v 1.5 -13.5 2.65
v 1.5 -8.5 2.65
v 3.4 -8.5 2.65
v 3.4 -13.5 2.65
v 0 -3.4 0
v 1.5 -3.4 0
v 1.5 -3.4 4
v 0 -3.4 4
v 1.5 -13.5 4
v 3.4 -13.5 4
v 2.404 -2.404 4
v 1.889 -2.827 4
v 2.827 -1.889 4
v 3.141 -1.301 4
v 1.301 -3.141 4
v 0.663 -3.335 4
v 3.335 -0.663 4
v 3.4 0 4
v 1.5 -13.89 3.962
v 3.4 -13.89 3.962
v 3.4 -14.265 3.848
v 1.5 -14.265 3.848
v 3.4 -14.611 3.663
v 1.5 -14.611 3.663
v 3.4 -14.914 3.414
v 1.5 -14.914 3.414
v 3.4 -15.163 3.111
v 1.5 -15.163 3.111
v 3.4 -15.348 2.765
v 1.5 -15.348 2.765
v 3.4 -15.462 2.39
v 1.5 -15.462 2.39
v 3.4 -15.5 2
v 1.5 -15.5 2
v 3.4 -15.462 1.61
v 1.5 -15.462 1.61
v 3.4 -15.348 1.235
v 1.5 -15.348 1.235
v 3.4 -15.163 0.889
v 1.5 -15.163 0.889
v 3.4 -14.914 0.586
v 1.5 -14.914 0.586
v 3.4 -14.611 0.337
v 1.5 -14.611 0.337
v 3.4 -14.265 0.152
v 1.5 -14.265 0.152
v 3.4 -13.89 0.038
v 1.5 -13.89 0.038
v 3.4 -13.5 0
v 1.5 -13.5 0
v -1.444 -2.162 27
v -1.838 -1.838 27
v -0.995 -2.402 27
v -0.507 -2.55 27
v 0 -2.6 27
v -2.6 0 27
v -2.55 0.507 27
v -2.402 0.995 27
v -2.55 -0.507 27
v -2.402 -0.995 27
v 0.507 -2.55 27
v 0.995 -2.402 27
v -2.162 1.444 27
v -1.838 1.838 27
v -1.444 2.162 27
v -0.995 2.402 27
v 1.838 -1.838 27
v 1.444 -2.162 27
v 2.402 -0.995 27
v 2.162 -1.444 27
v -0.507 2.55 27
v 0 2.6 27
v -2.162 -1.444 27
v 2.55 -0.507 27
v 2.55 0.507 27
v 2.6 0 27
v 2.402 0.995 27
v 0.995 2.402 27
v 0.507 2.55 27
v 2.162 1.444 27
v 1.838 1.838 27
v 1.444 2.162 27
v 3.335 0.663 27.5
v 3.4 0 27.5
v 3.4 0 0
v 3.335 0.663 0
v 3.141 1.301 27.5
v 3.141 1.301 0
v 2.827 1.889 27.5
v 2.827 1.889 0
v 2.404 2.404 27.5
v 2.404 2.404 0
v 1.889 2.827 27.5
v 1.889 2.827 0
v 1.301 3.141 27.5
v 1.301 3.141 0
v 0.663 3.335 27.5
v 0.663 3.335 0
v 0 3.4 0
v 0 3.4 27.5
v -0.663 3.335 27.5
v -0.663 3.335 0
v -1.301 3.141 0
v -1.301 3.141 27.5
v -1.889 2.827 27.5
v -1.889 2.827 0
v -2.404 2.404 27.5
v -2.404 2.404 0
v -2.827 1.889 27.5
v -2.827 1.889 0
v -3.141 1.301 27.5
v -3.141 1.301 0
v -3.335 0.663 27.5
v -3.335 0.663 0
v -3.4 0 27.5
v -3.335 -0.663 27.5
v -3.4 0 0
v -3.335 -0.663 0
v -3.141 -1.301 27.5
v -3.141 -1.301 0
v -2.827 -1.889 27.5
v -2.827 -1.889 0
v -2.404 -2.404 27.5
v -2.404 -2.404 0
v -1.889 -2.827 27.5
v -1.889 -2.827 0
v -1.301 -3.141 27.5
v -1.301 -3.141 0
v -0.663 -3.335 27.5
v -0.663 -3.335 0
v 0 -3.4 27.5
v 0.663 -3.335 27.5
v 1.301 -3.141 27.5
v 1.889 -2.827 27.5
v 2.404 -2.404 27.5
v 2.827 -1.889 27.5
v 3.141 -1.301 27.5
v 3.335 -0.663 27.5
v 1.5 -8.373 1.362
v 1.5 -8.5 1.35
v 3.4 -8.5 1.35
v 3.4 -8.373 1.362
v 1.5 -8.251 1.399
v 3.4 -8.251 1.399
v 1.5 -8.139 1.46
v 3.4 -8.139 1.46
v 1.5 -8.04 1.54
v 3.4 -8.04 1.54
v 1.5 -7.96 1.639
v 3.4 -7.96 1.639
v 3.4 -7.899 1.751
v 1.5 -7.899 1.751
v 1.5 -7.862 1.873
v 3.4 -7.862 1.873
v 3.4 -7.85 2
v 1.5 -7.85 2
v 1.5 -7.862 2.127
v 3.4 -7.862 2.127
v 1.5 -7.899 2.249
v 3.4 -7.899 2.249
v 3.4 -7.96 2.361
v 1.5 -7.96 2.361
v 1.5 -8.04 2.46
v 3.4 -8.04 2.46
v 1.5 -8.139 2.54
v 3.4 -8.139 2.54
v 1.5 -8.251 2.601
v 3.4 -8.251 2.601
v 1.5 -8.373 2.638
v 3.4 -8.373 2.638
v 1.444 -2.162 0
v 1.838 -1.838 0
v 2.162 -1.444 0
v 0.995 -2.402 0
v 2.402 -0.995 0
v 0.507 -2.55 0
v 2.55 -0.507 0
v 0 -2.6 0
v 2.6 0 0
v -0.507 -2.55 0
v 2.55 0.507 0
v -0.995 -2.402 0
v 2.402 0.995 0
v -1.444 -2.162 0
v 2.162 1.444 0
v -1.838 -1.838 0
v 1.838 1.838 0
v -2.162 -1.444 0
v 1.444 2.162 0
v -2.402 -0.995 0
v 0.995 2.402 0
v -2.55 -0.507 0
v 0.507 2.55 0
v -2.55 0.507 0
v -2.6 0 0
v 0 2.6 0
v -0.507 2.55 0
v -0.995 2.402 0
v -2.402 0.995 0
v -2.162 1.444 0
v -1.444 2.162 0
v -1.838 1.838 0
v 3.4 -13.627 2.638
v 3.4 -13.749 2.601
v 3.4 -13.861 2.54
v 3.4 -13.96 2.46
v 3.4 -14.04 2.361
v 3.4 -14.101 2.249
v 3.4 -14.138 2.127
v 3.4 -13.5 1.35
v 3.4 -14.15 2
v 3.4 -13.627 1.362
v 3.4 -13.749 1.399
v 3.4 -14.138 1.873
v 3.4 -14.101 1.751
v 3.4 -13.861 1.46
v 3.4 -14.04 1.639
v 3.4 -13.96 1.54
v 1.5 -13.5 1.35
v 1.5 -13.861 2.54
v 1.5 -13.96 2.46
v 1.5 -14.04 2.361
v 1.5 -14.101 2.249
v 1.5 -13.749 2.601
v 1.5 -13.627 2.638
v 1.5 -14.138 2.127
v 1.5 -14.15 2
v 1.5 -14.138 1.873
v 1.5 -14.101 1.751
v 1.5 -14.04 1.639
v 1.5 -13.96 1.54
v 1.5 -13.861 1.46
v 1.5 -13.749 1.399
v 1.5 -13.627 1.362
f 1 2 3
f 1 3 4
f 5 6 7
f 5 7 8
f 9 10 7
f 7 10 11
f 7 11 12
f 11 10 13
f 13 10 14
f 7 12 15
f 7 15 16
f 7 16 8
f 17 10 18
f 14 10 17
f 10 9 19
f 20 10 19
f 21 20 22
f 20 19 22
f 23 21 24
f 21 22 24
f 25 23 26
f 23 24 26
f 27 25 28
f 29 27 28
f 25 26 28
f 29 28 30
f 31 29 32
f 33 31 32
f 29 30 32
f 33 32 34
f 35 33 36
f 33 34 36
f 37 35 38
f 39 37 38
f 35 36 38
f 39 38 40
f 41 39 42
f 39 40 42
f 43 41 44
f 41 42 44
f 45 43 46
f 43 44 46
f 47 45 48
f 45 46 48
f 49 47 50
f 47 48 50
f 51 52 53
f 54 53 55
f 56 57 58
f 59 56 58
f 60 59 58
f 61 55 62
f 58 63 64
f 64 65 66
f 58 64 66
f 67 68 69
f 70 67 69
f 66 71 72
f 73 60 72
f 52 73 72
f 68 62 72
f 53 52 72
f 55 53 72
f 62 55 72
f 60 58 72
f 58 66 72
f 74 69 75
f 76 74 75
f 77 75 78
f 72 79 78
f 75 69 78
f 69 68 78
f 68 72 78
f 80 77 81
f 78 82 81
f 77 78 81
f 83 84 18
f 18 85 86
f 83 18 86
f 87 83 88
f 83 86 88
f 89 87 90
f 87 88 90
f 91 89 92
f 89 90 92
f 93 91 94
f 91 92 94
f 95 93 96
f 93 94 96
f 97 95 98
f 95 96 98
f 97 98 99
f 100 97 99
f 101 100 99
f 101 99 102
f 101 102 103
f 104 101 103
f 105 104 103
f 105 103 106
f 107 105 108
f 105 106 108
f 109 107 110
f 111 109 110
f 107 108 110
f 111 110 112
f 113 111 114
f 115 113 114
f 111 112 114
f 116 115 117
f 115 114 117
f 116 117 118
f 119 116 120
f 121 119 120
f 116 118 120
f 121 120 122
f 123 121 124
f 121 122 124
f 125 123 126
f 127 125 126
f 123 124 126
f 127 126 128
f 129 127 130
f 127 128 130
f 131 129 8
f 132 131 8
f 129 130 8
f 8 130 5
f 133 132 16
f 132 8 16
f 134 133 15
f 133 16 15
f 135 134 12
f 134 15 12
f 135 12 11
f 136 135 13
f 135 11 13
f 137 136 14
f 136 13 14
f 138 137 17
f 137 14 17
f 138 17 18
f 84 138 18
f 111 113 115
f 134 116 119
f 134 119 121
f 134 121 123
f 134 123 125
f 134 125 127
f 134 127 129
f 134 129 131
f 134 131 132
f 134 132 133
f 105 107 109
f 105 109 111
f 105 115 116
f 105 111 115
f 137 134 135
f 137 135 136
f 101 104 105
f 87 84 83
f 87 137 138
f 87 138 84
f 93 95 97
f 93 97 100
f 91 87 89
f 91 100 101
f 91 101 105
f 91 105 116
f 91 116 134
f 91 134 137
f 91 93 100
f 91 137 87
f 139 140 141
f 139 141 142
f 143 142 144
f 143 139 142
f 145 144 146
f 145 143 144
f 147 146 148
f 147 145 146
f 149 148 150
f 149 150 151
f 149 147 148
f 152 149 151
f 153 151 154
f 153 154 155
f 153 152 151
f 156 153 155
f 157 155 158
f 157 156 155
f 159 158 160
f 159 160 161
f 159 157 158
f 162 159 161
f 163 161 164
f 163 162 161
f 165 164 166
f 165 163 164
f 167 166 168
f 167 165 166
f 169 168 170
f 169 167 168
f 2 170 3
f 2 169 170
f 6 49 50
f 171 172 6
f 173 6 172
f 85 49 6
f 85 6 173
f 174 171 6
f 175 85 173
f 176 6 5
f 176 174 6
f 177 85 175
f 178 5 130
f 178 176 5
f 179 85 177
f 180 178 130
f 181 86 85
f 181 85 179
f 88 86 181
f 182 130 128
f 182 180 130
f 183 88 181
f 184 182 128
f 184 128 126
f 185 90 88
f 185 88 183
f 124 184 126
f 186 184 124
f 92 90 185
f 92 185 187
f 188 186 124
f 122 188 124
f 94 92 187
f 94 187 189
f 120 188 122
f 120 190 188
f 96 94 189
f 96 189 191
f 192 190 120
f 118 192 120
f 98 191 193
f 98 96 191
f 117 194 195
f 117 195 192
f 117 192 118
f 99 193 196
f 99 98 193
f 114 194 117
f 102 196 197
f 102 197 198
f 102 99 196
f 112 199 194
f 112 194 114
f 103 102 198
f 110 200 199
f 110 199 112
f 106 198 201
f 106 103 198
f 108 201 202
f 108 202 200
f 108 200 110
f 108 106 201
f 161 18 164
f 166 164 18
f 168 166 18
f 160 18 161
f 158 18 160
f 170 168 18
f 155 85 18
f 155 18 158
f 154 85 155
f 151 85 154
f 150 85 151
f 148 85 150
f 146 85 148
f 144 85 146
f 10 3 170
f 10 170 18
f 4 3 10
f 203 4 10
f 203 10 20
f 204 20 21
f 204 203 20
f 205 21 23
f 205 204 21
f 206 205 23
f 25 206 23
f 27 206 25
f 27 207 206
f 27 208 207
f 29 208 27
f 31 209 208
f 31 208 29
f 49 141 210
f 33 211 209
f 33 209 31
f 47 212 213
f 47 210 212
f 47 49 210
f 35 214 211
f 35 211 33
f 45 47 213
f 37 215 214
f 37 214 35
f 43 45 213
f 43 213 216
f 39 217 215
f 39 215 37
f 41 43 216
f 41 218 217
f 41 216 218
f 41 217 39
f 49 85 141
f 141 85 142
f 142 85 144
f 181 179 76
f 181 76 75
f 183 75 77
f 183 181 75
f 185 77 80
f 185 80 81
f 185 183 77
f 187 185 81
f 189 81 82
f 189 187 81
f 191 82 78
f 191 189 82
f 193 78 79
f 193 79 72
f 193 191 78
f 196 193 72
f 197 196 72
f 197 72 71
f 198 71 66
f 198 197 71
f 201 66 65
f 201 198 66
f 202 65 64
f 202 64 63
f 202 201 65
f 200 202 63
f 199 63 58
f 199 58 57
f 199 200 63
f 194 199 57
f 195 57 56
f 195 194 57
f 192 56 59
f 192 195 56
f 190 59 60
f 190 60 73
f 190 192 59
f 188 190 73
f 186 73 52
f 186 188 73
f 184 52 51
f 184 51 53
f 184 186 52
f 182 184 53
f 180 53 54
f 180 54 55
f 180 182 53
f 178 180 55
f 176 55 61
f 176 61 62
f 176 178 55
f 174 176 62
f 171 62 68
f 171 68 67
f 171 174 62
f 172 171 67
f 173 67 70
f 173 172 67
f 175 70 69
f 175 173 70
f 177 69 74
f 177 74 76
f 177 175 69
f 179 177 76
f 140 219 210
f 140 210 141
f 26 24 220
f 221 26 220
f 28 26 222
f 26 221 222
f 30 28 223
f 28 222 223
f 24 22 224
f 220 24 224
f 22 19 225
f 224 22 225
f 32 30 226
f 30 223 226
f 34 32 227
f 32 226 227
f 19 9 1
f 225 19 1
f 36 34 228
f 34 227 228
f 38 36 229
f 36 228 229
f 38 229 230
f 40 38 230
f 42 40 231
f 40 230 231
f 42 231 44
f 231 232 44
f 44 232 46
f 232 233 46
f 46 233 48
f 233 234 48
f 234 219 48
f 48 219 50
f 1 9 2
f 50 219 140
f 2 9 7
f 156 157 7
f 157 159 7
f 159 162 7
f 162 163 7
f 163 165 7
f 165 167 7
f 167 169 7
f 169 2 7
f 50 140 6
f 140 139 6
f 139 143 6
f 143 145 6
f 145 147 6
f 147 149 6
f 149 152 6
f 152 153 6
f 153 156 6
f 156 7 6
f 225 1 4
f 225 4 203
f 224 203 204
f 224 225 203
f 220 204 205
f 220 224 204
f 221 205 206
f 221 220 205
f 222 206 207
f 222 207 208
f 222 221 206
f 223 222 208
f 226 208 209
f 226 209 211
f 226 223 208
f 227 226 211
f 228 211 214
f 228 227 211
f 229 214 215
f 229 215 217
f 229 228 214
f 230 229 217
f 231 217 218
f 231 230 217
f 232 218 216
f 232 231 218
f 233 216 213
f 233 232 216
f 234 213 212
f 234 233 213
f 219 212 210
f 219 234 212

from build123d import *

# Parameters (mm, degrees)
ESQUISSE5_R        = 3.4
ESQUISSE5_R_2      = 2.6
BOSS_EXTRU_1_DEPTH = 27
ESQUISSE6_R        = 3.4
BOSS_EXTRU_2_DEPTH = 0.5
BOSS_EXTRU_4_START = 1.5
BOSS_EXTRU_4_DEPTH = 1.9
BOSS_EXTRU_5_DEPTH = 4


with BuildPart() as part:
    # Esquisse5 → Boss.-Extru.1 (new body)
    with BuildSketch(Plane.XY):
        Circle(ESQUISSE5_R)
        Circle(ESQUISSE5_R_2, mode=Mode.SUBTRACT)
    extrude(amount=BOSS_EXTRU_1_DEPTH)

    # Esquisse6 → Boss.-Extru.2 (add)
    with BuildSketch(Plane.XY.offset(27)):
        Circle(ESQUISSE6_R)
    extrude(amount=BOSS_EXTRU_2_DEPTH)



with BuildPart() as body_2:
    # Esquisse9 → Boss.-Extru.4 (new body)
    with BuildSketch(Plane(origin=(0, 0, 0), x_dir=(0, 0, -1), z_dir=(1, 0, 0)).offset(BOSS_EXTRU_4_START)):
        with BuildLine():
            Line((-4, -3.4), (-4, -13.5))
            ThreePointArc((-4, -13.5), (-2, -15.5), (0, -13.5))
            Line((0, -13.5), (0, -3.4))
            Line((0, -3.4), (-4, -3.4))
        make_face()
        with BuildLine():
            ThreePointArc((-1.35, -8.5), (-2, -7.85), (-2.65, -8.5))
            Line((-2.65, -8.5), (-2.65, -13.5))
            ThreePointArc((-2.65, -13.5), (-2, -14.15), (-1.35, -13.5))
            Line((-1.35, -13.5), (-1.35, -8.5))
        make_face(mode=Mode.SUBTRACT)
    extrude(amount=BOSS_EXTRU_4_DEPTH)


with BuildPart() as part_1:
    add(part.part)

    add(body_2.part)  # Boss.-Extru.5 merges body 2
    # Esquisse10 → Boss.-Extru.5 (add)
    with BuildSketch(Plane(origin=(0, 0, 0), x_dir=(-1, 0, 0), z_dir=(0, 0, -1))):
        with BuildLine():
            Line((-3.4, -3.4), (0, -3.4))
            ThreePointArc((0, -3.4), (-2.404163056, -2.404163056), (-3.4, 0))
            Line((-3.4, 0), (-3.4, -3.4))
        make_face()
    extrude(amount=-BOSS_EXTRU_5_DEPTH)


solid = part_1.part
